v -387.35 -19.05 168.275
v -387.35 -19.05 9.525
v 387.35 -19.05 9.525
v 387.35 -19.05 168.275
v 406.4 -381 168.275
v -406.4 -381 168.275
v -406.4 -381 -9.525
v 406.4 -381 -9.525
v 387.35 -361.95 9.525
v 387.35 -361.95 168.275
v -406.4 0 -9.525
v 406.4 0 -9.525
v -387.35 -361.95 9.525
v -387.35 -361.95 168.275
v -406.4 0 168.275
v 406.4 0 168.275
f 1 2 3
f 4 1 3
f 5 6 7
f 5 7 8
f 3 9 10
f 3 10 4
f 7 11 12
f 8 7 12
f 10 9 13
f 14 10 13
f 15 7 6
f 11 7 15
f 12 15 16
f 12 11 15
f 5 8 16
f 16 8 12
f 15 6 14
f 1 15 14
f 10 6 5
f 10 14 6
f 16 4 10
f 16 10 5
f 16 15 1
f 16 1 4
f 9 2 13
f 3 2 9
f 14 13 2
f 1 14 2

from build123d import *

# Parameters (mm, degrees)
F0_W     = 812.8
F0_H     = 19.05
F1_DEPTH = 381
F2_W     = 19.05
F2_H     = 361.95
F3_DEPTH = 158.75
F5_W     = 774.7
F5_H     = 19.05
F6_DEPTH = 158.75


with BuildPart() as f1:
    # F0 (on Front) → F1 (new body)
    with BuildSketch(Plane.XZ):
        Rectangle(F0_W, F0_H)
    extrude(amount=F1_DEPTH)

    # F2 (on face) → F3 (join)
    with BuildSketch(Plane.XY.offset(9.525)):
        with Locations((-396.875, -180.975)):
            Rectangle(F2_W, F2_H)
    extrude(amount=F3_DEPTH)

    # F4: F1 across plane


with BuildPart() as f1_1:
    add(f1.part)
    add(f1.part.mirror(Plane.YZ))

    # F5 (on face) → F6 (join, through all)
    with BuildSketch(Plane.XY.offset(9.525)):
        with Locations((0, -9.525)):
            Rectangle(F5_W, F5_H)
        Polygon((387.35, -361.95), (-387.35, -361.95), (-406.4, -361.95), (-406.4, -381), (406.4, -381), (406.4, -361.95), align=None)
    extrude(amount=F6_DEPTH)


solid = f1_1.part
